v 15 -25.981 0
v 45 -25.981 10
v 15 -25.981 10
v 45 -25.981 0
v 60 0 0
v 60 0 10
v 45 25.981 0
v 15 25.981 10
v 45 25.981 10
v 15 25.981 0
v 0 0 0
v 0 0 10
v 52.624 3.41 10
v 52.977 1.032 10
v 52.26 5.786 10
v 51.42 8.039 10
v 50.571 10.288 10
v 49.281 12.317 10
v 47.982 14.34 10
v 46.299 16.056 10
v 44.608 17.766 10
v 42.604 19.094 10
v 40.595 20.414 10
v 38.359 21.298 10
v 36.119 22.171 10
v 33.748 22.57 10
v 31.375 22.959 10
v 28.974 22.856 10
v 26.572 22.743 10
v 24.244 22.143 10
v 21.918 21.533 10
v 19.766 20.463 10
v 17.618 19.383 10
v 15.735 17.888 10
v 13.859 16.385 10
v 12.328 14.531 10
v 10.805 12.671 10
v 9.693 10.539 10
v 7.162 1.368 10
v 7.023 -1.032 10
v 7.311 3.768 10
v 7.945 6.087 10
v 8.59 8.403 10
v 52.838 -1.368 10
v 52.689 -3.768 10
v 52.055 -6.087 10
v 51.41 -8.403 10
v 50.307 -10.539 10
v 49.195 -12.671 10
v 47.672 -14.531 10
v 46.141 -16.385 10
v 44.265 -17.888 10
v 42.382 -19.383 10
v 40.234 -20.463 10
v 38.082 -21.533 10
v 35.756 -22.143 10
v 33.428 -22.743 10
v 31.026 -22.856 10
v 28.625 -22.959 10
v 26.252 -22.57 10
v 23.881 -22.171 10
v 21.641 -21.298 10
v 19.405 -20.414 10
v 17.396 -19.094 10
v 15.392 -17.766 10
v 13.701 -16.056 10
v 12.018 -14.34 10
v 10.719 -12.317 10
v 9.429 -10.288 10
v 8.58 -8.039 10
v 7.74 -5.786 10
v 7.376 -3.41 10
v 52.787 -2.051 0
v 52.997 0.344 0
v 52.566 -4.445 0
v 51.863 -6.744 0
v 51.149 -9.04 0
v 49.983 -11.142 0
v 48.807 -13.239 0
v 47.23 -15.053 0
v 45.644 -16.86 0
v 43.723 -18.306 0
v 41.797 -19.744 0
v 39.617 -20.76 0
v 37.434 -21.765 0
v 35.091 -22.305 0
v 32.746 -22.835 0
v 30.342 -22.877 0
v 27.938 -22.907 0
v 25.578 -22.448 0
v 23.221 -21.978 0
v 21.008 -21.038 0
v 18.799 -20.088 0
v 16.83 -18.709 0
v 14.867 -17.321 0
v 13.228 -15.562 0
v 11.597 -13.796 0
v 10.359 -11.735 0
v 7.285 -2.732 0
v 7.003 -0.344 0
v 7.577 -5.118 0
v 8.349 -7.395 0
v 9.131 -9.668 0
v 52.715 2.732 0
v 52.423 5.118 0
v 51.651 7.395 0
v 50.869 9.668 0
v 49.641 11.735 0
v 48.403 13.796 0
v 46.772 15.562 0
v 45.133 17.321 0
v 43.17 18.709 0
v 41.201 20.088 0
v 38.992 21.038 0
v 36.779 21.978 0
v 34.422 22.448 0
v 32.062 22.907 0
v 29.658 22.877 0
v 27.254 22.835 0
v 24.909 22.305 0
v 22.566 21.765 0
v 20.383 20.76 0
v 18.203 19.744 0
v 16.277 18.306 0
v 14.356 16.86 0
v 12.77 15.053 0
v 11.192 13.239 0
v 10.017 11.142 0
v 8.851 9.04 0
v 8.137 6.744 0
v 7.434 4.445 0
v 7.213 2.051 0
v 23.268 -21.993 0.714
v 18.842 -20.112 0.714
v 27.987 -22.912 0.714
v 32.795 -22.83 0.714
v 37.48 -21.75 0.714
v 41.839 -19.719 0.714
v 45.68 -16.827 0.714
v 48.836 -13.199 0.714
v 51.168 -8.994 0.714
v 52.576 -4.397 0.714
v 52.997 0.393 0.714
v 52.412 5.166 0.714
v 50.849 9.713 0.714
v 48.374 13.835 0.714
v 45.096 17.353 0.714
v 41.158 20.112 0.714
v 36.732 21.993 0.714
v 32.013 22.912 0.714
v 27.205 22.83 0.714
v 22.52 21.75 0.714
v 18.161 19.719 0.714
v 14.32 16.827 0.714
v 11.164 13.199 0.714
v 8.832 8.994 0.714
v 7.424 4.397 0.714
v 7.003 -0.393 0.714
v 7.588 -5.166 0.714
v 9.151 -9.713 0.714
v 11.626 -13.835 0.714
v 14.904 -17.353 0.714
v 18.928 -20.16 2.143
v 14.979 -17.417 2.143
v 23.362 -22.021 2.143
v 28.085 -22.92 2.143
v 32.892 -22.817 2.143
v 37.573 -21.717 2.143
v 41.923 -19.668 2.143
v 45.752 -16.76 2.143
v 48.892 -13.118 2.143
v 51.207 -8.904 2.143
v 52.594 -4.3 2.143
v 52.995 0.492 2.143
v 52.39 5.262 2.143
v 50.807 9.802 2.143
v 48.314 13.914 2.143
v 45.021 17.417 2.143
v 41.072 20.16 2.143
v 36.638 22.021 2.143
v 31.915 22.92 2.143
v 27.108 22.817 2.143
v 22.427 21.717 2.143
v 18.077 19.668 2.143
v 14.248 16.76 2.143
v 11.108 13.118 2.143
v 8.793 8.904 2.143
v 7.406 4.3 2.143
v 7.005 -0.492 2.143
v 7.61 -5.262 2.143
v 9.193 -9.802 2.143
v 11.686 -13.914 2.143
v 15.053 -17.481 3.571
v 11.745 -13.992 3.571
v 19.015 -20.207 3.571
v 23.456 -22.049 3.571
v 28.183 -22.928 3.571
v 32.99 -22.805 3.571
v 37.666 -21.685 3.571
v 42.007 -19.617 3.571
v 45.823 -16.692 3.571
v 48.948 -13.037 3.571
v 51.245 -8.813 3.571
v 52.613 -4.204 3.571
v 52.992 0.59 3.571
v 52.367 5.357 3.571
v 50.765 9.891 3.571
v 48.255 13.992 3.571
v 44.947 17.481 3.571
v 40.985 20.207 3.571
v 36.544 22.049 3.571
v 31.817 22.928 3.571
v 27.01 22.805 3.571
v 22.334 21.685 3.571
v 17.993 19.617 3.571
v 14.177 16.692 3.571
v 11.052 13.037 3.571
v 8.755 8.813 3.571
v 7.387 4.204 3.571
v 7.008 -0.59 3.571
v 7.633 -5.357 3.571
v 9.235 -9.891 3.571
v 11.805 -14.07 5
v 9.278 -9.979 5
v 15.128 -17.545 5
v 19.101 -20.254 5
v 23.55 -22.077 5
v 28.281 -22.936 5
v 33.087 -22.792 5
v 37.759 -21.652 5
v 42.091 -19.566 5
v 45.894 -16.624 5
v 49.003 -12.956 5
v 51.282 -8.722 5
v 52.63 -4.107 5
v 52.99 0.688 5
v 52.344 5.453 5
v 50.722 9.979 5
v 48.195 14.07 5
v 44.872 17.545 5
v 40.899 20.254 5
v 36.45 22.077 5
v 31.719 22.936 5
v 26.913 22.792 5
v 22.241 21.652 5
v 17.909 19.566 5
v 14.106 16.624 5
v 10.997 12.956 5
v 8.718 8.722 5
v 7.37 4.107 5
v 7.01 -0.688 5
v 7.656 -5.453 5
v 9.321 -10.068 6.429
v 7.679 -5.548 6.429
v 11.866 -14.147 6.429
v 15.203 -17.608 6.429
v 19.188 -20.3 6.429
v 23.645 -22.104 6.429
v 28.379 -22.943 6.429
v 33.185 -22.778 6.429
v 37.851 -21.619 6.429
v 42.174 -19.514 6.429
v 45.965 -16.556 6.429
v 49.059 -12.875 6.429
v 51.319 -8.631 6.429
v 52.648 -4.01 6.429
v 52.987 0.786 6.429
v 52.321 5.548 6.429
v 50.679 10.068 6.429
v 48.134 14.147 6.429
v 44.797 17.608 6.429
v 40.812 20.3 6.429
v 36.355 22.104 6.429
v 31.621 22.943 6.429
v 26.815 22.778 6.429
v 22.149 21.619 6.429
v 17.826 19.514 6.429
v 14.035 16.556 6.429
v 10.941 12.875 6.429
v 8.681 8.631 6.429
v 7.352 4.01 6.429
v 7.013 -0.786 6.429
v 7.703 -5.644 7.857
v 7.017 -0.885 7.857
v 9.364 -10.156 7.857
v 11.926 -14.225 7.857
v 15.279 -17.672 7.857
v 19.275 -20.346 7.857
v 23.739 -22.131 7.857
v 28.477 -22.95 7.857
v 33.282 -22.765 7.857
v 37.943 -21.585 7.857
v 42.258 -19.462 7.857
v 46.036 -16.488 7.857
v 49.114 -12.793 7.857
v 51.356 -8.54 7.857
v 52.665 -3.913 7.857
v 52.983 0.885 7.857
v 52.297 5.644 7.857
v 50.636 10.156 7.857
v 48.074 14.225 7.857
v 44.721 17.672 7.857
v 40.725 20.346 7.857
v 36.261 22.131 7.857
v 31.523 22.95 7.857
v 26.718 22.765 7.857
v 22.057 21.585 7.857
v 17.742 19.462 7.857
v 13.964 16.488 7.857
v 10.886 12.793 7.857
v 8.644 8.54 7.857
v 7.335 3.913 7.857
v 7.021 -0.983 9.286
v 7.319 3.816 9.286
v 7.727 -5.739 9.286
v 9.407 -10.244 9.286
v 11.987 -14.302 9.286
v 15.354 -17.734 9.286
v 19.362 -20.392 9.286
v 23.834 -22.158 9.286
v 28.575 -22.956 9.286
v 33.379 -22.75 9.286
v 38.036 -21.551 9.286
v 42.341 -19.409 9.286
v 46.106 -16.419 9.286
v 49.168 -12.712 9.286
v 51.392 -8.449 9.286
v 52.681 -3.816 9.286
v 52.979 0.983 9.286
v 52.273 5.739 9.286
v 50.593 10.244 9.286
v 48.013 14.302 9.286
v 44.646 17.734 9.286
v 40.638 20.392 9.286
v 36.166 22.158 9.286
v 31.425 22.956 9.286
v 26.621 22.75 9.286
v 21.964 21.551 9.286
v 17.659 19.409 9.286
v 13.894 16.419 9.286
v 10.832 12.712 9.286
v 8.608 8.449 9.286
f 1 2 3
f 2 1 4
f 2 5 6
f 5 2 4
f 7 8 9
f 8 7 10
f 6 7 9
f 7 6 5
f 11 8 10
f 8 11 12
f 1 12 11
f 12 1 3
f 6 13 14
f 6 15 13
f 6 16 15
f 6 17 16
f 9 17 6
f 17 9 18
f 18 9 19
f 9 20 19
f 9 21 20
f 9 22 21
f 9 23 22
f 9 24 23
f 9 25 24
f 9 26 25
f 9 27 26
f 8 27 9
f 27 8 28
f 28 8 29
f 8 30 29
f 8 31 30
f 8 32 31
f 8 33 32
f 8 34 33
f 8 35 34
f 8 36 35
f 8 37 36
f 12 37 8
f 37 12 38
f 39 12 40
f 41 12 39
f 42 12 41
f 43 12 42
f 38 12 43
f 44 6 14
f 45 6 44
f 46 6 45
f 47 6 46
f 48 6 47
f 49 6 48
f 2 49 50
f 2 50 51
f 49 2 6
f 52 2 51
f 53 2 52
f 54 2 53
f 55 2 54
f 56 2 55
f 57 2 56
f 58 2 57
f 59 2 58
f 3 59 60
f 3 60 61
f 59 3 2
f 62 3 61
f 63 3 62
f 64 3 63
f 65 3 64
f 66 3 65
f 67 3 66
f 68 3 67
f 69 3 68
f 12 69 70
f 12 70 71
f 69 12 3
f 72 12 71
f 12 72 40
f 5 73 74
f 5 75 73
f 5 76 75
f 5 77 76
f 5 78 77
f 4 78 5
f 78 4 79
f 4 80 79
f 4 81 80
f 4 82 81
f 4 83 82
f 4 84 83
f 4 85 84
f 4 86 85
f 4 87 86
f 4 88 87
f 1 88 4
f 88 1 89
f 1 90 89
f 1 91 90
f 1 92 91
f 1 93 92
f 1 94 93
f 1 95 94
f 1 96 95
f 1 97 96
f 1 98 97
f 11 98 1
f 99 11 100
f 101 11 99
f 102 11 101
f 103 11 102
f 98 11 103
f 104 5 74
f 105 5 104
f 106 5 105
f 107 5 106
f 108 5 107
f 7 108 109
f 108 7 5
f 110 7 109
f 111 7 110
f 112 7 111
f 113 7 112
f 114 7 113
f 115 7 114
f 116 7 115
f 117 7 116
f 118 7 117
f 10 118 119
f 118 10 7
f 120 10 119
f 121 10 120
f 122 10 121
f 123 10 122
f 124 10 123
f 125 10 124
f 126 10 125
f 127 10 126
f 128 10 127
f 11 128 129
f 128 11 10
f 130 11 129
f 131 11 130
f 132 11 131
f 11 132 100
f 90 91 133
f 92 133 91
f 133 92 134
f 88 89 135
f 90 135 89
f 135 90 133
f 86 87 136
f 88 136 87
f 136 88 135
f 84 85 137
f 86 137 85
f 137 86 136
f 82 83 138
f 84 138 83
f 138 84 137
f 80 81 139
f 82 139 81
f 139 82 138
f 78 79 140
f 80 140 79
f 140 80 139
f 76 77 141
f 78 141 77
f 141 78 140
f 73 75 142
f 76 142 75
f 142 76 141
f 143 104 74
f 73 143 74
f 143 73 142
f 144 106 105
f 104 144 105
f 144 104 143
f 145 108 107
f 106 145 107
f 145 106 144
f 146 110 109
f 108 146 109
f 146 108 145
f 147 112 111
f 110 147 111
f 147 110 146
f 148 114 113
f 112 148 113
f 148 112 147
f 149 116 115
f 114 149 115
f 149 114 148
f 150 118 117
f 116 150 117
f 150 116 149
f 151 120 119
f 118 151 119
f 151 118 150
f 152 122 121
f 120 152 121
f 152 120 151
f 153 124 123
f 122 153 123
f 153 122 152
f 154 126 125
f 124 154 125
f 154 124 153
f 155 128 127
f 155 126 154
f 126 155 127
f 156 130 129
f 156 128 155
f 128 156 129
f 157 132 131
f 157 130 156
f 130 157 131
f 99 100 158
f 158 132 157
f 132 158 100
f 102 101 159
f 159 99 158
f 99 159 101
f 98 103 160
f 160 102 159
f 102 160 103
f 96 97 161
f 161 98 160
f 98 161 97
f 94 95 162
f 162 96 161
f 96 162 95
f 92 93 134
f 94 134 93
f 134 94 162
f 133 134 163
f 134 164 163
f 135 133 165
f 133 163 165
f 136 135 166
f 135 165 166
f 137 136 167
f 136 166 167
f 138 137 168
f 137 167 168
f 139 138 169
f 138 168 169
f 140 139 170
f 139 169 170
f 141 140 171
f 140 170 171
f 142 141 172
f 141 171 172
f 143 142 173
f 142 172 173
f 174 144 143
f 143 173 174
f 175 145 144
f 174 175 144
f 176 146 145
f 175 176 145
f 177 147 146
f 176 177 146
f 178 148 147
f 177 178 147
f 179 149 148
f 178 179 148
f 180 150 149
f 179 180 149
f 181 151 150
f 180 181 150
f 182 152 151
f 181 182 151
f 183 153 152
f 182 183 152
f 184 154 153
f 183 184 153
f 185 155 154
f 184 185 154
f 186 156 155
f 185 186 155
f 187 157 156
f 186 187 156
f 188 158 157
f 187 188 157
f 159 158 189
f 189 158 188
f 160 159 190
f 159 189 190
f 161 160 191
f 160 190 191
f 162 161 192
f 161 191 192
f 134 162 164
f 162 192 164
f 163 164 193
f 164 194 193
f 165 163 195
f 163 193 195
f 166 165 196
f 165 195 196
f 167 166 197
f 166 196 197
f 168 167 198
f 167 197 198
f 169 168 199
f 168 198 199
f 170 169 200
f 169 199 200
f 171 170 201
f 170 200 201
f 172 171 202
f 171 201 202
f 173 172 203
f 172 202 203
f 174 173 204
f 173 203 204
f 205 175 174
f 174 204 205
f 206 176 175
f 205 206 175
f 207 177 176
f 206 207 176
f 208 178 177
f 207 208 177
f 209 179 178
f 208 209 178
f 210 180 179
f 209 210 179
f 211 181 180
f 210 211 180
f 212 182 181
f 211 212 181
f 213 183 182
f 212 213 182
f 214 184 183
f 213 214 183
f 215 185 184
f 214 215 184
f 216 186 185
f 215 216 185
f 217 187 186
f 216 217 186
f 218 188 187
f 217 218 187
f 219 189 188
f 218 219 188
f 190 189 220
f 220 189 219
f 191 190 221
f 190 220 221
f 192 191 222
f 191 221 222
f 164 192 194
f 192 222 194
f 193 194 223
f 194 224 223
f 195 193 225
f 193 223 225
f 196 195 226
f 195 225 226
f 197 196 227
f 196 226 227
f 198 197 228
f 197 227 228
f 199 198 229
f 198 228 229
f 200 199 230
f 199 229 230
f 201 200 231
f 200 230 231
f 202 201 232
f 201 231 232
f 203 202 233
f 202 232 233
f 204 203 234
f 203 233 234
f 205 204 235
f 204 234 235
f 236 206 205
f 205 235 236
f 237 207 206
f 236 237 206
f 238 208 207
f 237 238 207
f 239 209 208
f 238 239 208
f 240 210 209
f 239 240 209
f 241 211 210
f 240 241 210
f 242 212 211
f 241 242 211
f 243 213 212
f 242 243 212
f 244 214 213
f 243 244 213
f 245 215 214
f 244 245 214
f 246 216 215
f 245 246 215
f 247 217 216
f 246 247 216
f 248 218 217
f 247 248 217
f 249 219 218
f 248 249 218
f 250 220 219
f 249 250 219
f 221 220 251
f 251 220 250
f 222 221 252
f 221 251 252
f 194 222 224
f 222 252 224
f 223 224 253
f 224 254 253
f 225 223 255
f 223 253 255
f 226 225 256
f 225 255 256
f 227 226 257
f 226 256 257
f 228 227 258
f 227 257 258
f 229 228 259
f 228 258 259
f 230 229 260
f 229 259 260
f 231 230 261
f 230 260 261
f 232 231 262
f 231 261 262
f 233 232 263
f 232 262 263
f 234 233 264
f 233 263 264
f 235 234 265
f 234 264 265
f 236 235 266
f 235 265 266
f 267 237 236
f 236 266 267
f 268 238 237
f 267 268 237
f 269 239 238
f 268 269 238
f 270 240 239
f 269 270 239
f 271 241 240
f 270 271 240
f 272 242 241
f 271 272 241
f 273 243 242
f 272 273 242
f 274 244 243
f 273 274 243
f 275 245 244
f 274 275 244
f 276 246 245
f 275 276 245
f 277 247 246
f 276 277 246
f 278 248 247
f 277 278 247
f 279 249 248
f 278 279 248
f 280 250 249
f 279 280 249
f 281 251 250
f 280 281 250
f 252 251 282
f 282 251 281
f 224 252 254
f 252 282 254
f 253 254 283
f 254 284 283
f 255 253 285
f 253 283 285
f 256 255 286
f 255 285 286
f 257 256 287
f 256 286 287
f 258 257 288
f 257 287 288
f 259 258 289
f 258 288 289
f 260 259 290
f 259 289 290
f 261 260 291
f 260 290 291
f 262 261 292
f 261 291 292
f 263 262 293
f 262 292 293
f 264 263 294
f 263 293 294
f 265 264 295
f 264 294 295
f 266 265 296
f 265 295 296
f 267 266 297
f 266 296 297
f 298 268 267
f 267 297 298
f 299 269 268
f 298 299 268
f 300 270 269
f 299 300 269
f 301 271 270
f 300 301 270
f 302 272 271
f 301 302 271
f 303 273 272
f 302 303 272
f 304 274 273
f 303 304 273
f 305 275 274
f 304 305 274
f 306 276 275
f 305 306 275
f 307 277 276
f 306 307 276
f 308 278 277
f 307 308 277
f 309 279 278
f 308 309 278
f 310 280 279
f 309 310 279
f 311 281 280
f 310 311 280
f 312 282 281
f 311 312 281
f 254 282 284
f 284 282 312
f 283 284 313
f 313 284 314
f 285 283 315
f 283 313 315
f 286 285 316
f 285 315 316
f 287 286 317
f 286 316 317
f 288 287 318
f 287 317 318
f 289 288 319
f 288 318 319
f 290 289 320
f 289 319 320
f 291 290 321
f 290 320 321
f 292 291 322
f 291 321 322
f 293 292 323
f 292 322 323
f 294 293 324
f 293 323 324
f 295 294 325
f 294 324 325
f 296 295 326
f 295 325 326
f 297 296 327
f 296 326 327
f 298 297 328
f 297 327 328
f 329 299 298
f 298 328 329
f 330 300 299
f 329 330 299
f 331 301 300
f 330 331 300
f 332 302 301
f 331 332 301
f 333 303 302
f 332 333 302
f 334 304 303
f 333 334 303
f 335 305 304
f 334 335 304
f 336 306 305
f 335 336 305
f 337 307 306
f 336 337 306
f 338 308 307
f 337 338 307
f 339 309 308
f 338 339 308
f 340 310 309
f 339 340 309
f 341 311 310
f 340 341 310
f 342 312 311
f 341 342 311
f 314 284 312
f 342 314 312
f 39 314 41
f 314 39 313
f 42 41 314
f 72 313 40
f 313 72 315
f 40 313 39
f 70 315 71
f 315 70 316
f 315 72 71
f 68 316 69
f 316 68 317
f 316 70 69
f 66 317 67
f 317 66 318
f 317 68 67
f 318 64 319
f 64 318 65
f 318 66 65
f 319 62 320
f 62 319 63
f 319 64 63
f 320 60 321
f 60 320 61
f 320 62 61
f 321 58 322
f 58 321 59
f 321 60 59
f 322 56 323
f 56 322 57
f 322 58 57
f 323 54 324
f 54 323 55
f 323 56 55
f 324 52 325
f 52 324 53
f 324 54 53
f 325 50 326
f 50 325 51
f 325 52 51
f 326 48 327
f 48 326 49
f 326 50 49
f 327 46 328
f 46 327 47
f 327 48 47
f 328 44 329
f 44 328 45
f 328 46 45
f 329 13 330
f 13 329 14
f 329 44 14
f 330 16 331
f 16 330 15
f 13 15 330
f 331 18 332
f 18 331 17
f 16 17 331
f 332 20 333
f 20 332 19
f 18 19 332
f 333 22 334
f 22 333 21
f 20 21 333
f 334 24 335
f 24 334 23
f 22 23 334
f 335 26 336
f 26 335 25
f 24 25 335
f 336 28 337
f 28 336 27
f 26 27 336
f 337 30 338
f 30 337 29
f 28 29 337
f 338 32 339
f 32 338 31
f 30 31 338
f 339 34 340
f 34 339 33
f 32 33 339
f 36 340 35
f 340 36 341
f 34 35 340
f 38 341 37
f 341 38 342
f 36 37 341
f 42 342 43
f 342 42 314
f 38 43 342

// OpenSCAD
//difference() {
//    cylinder(r=15,h=200,$fn=6,true);
//    cylinder(r=12,h=200,$fn=6);    
//}
module screw(type = 2, r1 = 15, r2 = 10, n = 7, h = 50, t = 8)
{
	linear_extrude(height = h, twist = 360*t/n, convexity = t)
	difference() {
		circle(r2);
		for (i = [0:n-1]) {

		}
	}
}

module nut(type = 2, r1 = 16, r2 = 23, r3 = 30, s = 6, n = 7, h = 50/5, t = 8/5)
{
	difference() {
		cylinder($fn = s, r = r3, h = h);
		translate([ 0, 0, -h/2 ]) screw(type, r1, r2, n, h*2, t*2);
	}
}






translate([ 30, 0, 0 ])
nut();
